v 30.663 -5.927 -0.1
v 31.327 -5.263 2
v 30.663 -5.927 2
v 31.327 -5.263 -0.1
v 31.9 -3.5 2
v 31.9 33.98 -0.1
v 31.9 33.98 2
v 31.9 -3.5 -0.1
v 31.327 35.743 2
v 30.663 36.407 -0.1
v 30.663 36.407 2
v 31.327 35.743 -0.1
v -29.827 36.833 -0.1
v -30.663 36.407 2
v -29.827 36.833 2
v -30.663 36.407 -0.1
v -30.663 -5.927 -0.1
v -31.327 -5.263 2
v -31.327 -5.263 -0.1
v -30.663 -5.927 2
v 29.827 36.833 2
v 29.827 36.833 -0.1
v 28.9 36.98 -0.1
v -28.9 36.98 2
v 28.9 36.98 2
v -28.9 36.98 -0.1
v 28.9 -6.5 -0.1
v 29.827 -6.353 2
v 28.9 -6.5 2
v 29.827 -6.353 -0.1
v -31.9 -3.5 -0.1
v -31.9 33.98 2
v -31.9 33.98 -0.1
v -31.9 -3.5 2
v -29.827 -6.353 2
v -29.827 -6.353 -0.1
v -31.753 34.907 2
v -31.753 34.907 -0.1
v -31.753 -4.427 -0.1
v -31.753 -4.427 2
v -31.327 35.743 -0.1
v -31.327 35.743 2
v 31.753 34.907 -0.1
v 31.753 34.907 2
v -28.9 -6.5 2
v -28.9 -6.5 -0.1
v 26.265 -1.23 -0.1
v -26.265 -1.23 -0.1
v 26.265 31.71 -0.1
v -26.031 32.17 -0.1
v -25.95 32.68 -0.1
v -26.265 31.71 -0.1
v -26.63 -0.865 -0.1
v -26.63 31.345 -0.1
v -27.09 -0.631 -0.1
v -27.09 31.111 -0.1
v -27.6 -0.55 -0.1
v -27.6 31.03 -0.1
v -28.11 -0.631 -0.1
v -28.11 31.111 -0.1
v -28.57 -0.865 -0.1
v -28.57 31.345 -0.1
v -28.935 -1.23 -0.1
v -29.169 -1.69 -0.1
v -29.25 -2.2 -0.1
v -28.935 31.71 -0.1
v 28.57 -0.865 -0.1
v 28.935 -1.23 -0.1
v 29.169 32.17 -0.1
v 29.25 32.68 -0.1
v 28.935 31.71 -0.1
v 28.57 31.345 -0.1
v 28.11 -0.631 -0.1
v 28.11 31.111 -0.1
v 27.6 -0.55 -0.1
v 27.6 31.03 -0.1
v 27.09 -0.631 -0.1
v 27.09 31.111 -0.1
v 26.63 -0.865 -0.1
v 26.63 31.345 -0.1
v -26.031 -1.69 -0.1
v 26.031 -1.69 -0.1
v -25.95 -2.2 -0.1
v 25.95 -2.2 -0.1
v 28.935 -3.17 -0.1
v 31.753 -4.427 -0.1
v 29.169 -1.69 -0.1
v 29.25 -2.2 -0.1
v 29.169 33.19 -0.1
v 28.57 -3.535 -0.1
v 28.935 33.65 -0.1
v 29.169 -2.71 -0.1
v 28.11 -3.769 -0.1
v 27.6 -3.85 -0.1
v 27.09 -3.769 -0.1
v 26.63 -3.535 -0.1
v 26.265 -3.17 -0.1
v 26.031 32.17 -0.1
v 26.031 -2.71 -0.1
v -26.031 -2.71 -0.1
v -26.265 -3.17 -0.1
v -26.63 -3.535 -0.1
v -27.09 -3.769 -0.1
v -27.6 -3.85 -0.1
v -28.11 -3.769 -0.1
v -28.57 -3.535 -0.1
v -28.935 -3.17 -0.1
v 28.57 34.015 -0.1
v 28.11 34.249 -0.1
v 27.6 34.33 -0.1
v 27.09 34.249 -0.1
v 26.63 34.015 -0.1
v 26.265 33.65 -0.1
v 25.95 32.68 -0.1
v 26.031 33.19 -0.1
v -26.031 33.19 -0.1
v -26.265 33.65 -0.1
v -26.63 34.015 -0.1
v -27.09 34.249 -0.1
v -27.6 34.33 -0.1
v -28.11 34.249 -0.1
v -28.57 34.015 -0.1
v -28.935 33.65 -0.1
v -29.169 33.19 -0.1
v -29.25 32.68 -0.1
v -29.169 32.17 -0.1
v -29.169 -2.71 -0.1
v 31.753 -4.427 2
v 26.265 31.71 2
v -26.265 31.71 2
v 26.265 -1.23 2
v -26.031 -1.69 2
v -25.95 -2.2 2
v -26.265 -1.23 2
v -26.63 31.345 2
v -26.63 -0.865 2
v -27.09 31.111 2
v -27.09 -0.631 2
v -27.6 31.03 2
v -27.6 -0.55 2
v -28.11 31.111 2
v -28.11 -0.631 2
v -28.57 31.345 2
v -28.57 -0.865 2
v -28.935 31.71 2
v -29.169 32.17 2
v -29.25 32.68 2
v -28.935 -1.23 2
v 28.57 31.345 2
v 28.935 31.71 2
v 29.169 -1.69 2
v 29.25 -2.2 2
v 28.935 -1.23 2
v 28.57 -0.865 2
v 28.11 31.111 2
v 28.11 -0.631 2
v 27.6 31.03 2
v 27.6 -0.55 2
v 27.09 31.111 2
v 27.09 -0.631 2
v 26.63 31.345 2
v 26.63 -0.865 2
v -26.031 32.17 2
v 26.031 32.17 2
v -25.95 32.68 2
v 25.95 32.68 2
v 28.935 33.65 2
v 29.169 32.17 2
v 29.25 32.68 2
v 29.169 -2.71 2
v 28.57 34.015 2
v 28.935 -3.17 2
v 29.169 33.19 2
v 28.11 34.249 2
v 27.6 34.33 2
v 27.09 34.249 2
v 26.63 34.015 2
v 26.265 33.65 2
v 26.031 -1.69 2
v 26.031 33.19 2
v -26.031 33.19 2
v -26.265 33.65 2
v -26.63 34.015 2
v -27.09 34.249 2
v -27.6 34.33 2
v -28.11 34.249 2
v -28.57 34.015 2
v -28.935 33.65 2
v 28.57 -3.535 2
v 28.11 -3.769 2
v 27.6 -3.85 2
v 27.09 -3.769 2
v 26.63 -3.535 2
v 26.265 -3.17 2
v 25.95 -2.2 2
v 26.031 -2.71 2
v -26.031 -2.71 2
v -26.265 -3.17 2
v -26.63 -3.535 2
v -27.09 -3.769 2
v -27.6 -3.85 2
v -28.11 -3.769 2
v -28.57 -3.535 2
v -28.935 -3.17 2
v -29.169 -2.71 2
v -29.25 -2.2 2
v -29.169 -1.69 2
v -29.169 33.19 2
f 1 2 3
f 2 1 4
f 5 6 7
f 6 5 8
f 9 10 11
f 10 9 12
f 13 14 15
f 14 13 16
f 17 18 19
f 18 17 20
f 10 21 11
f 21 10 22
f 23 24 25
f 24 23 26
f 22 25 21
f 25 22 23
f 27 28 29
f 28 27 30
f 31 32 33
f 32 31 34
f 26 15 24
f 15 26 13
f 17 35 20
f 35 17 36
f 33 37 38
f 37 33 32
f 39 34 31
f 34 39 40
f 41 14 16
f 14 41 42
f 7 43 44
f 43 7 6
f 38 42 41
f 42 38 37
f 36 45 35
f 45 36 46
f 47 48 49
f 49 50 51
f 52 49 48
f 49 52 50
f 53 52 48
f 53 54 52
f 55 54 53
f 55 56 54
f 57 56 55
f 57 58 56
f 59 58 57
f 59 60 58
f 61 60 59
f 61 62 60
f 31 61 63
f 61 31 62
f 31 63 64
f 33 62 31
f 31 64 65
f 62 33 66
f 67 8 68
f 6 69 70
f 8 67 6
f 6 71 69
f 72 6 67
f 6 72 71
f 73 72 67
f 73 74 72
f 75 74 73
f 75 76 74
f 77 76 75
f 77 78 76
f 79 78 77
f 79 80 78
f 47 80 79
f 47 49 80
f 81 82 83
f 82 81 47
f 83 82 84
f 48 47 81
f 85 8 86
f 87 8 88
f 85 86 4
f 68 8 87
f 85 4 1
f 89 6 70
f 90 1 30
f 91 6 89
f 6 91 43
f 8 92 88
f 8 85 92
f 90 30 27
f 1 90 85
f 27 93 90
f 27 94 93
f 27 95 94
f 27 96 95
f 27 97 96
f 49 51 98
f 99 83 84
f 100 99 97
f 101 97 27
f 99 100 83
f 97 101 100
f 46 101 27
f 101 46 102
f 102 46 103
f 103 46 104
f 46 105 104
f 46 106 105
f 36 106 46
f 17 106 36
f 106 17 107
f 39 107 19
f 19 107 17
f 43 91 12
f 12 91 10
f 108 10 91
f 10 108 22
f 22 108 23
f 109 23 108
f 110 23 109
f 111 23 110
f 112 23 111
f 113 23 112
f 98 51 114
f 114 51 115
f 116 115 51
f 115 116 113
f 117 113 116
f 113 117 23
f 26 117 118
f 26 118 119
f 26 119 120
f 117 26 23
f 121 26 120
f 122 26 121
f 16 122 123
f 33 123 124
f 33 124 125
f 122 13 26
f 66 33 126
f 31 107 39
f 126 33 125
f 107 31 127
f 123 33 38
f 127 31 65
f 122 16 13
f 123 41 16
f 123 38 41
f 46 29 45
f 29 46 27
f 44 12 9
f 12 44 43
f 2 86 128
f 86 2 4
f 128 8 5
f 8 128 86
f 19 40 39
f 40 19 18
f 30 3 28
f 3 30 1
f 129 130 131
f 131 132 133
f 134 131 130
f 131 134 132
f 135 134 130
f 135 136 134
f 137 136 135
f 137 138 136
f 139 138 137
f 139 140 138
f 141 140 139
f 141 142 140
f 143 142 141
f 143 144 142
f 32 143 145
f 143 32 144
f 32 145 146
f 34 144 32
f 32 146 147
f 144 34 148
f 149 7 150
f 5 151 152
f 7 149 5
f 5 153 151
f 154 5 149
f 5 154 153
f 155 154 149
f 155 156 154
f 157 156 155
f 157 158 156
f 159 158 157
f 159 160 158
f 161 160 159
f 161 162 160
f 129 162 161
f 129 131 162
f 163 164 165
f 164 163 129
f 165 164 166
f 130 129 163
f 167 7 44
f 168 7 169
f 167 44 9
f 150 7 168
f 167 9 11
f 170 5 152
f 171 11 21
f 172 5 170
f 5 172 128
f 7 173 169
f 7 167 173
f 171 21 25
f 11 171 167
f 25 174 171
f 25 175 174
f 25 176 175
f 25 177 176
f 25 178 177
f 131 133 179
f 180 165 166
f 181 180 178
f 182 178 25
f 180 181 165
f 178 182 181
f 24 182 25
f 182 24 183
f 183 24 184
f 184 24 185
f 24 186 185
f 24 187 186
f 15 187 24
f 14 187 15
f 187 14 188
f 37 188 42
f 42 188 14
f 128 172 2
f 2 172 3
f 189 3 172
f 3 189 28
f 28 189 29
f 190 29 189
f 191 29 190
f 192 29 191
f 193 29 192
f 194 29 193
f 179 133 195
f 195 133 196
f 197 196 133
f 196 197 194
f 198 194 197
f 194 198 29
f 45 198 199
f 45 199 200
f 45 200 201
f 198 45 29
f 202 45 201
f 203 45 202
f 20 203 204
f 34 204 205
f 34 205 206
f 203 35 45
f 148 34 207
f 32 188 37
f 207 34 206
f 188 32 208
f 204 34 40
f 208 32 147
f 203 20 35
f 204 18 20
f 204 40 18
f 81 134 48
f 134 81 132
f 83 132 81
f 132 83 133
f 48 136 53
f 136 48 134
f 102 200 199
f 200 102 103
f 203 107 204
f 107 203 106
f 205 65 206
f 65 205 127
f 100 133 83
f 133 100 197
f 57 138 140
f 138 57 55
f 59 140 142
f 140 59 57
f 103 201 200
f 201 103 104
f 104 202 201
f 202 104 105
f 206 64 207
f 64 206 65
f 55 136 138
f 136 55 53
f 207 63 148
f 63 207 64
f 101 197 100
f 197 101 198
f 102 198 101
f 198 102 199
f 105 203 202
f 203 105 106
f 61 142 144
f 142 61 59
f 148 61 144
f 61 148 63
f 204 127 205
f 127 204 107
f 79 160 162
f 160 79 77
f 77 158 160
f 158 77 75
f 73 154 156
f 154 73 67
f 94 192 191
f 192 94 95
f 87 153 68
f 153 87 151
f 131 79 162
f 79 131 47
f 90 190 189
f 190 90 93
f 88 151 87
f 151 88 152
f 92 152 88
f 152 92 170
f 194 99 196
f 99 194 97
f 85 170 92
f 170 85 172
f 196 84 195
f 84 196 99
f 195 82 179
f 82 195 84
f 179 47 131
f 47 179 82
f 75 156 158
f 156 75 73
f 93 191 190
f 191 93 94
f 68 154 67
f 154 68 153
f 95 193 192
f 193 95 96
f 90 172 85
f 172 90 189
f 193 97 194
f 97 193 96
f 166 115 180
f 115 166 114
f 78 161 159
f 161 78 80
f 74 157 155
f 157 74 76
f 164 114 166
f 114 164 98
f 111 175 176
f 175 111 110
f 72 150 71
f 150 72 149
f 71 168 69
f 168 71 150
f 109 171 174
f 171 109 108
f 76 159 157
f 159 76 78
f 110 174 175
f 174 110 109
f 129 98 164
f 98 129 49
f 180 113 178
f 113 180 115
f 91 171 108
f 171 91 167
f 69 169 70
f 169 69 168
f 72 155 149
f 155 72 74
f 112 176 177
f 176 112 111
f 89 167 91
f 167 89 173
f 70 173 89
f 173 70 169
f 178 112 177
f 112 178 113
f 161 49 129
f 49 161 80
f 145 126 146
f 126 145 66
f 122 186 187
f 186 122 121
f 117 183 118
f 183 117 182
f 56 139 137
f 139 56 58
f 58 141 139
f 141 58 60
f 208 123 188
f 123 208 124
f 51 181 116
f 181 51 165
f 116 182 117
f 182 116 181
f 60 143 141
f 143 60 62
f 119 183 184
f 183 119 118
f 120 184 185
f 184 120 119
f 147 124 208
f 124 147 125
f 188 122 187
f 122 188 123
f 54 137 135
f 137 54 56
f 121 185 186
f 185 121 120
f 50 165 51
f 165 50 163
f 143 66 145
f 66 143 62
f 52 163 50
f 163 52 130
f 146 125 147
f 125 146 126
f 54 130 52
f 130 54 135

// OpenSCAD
// file: ../configuration.scad
//Název boxu (zařízení)
box_jmeno="";

vzdalenost_der = 10.16; //rozteč děr mezi sebou
radidus_hrany = 3; //radius zaobleni sloupku
vzdalenost_od_okraje = 5.2; //vzdalenost stredu upevnovaci diry od kraje desky
pocet_der1 = 4; //pocet děr v ose y
pocet_der2 = 6; //pocet der v ose x



//OBECNE PARAMETRY KRABICKY
//------------------------------------------------------------
//BOCNICE
vyska_bocnice=40;
tloustka_bocnice=3;


//PLBASE PARAMETRY
//------------------------------------------------------------
tloustka_plbase = 2; //tloustka plbase - dna
prekryti_der=0.8; //sila materiálu, který překrývá díry, aby nebyli vidět

plbase_tolerance_horni=0.5; //pro zvětšení tolerance aby tam šlo dát  horní čelíčko


//Rozmery loga MLAB
//------------------------------------------------------------
logo_vyska=0.15;
logo_sirka=0.15;
// file: ../configuration/manufactury_conf.scad
$fn=20; // model faces resolution.

 //Sroub - podpěra pro tisk sloupku
        vyska_podpery=12;
        vyska_mat_pod_matici=3;

//Sroub - parametry
vyska_hlavy = 3.5;
prumer_hlavy=6;
prumer_sroubu=3.3;

//Matice - parametry
prumer_matice=6; //hrany k hraně
vyska_matice=3;  //vyska matice
posuv_dorazu=1;  //pro moznost posuvu dorazu pro vsunutí matice
matice_sila_materialu=2; //sila materialu pod maticí na ose z


//Lišta parametry
//---------------------------------------------------
//rozměry výrezu v ose y
vzdalenost_od_diry = 5; //vzdalenost od stredu upevnovaci diry na druhou stranu


//Spodní Kryt
vyska_prekryti_spodni=3;
vyska_prekryti_vrchni=4;
prekryti_tolerance=0.6;
tolerance_na_nasunuti=0.3;
sila_spodniho_krytu=1;

//Pro vrchni PLBASE
hrana_bocnice=1.2; //udává jaká síla bocnice zůstane v části zapustěni vrchního čelička
// main file
use <../configuration/plbase.scad>



include <../configuration/manufactury_conf.scad>
include <../configuration.scad>


translate([0,0,tloustka_plbase/2])
    rotate(a=[0,0,0])
    { 
        plbase_vrchni_kryt_pro_odecet(pocet_der1-1,pocet_der2-1,radidus_hrany,vzdalenost_der,vzdalenost_od_okraje,prumer_sroubu,vyska_bocnice,prekryti_der,tloustka_bocnice,plbase_tolerance_horni,tloustka_plbase);    
    }
